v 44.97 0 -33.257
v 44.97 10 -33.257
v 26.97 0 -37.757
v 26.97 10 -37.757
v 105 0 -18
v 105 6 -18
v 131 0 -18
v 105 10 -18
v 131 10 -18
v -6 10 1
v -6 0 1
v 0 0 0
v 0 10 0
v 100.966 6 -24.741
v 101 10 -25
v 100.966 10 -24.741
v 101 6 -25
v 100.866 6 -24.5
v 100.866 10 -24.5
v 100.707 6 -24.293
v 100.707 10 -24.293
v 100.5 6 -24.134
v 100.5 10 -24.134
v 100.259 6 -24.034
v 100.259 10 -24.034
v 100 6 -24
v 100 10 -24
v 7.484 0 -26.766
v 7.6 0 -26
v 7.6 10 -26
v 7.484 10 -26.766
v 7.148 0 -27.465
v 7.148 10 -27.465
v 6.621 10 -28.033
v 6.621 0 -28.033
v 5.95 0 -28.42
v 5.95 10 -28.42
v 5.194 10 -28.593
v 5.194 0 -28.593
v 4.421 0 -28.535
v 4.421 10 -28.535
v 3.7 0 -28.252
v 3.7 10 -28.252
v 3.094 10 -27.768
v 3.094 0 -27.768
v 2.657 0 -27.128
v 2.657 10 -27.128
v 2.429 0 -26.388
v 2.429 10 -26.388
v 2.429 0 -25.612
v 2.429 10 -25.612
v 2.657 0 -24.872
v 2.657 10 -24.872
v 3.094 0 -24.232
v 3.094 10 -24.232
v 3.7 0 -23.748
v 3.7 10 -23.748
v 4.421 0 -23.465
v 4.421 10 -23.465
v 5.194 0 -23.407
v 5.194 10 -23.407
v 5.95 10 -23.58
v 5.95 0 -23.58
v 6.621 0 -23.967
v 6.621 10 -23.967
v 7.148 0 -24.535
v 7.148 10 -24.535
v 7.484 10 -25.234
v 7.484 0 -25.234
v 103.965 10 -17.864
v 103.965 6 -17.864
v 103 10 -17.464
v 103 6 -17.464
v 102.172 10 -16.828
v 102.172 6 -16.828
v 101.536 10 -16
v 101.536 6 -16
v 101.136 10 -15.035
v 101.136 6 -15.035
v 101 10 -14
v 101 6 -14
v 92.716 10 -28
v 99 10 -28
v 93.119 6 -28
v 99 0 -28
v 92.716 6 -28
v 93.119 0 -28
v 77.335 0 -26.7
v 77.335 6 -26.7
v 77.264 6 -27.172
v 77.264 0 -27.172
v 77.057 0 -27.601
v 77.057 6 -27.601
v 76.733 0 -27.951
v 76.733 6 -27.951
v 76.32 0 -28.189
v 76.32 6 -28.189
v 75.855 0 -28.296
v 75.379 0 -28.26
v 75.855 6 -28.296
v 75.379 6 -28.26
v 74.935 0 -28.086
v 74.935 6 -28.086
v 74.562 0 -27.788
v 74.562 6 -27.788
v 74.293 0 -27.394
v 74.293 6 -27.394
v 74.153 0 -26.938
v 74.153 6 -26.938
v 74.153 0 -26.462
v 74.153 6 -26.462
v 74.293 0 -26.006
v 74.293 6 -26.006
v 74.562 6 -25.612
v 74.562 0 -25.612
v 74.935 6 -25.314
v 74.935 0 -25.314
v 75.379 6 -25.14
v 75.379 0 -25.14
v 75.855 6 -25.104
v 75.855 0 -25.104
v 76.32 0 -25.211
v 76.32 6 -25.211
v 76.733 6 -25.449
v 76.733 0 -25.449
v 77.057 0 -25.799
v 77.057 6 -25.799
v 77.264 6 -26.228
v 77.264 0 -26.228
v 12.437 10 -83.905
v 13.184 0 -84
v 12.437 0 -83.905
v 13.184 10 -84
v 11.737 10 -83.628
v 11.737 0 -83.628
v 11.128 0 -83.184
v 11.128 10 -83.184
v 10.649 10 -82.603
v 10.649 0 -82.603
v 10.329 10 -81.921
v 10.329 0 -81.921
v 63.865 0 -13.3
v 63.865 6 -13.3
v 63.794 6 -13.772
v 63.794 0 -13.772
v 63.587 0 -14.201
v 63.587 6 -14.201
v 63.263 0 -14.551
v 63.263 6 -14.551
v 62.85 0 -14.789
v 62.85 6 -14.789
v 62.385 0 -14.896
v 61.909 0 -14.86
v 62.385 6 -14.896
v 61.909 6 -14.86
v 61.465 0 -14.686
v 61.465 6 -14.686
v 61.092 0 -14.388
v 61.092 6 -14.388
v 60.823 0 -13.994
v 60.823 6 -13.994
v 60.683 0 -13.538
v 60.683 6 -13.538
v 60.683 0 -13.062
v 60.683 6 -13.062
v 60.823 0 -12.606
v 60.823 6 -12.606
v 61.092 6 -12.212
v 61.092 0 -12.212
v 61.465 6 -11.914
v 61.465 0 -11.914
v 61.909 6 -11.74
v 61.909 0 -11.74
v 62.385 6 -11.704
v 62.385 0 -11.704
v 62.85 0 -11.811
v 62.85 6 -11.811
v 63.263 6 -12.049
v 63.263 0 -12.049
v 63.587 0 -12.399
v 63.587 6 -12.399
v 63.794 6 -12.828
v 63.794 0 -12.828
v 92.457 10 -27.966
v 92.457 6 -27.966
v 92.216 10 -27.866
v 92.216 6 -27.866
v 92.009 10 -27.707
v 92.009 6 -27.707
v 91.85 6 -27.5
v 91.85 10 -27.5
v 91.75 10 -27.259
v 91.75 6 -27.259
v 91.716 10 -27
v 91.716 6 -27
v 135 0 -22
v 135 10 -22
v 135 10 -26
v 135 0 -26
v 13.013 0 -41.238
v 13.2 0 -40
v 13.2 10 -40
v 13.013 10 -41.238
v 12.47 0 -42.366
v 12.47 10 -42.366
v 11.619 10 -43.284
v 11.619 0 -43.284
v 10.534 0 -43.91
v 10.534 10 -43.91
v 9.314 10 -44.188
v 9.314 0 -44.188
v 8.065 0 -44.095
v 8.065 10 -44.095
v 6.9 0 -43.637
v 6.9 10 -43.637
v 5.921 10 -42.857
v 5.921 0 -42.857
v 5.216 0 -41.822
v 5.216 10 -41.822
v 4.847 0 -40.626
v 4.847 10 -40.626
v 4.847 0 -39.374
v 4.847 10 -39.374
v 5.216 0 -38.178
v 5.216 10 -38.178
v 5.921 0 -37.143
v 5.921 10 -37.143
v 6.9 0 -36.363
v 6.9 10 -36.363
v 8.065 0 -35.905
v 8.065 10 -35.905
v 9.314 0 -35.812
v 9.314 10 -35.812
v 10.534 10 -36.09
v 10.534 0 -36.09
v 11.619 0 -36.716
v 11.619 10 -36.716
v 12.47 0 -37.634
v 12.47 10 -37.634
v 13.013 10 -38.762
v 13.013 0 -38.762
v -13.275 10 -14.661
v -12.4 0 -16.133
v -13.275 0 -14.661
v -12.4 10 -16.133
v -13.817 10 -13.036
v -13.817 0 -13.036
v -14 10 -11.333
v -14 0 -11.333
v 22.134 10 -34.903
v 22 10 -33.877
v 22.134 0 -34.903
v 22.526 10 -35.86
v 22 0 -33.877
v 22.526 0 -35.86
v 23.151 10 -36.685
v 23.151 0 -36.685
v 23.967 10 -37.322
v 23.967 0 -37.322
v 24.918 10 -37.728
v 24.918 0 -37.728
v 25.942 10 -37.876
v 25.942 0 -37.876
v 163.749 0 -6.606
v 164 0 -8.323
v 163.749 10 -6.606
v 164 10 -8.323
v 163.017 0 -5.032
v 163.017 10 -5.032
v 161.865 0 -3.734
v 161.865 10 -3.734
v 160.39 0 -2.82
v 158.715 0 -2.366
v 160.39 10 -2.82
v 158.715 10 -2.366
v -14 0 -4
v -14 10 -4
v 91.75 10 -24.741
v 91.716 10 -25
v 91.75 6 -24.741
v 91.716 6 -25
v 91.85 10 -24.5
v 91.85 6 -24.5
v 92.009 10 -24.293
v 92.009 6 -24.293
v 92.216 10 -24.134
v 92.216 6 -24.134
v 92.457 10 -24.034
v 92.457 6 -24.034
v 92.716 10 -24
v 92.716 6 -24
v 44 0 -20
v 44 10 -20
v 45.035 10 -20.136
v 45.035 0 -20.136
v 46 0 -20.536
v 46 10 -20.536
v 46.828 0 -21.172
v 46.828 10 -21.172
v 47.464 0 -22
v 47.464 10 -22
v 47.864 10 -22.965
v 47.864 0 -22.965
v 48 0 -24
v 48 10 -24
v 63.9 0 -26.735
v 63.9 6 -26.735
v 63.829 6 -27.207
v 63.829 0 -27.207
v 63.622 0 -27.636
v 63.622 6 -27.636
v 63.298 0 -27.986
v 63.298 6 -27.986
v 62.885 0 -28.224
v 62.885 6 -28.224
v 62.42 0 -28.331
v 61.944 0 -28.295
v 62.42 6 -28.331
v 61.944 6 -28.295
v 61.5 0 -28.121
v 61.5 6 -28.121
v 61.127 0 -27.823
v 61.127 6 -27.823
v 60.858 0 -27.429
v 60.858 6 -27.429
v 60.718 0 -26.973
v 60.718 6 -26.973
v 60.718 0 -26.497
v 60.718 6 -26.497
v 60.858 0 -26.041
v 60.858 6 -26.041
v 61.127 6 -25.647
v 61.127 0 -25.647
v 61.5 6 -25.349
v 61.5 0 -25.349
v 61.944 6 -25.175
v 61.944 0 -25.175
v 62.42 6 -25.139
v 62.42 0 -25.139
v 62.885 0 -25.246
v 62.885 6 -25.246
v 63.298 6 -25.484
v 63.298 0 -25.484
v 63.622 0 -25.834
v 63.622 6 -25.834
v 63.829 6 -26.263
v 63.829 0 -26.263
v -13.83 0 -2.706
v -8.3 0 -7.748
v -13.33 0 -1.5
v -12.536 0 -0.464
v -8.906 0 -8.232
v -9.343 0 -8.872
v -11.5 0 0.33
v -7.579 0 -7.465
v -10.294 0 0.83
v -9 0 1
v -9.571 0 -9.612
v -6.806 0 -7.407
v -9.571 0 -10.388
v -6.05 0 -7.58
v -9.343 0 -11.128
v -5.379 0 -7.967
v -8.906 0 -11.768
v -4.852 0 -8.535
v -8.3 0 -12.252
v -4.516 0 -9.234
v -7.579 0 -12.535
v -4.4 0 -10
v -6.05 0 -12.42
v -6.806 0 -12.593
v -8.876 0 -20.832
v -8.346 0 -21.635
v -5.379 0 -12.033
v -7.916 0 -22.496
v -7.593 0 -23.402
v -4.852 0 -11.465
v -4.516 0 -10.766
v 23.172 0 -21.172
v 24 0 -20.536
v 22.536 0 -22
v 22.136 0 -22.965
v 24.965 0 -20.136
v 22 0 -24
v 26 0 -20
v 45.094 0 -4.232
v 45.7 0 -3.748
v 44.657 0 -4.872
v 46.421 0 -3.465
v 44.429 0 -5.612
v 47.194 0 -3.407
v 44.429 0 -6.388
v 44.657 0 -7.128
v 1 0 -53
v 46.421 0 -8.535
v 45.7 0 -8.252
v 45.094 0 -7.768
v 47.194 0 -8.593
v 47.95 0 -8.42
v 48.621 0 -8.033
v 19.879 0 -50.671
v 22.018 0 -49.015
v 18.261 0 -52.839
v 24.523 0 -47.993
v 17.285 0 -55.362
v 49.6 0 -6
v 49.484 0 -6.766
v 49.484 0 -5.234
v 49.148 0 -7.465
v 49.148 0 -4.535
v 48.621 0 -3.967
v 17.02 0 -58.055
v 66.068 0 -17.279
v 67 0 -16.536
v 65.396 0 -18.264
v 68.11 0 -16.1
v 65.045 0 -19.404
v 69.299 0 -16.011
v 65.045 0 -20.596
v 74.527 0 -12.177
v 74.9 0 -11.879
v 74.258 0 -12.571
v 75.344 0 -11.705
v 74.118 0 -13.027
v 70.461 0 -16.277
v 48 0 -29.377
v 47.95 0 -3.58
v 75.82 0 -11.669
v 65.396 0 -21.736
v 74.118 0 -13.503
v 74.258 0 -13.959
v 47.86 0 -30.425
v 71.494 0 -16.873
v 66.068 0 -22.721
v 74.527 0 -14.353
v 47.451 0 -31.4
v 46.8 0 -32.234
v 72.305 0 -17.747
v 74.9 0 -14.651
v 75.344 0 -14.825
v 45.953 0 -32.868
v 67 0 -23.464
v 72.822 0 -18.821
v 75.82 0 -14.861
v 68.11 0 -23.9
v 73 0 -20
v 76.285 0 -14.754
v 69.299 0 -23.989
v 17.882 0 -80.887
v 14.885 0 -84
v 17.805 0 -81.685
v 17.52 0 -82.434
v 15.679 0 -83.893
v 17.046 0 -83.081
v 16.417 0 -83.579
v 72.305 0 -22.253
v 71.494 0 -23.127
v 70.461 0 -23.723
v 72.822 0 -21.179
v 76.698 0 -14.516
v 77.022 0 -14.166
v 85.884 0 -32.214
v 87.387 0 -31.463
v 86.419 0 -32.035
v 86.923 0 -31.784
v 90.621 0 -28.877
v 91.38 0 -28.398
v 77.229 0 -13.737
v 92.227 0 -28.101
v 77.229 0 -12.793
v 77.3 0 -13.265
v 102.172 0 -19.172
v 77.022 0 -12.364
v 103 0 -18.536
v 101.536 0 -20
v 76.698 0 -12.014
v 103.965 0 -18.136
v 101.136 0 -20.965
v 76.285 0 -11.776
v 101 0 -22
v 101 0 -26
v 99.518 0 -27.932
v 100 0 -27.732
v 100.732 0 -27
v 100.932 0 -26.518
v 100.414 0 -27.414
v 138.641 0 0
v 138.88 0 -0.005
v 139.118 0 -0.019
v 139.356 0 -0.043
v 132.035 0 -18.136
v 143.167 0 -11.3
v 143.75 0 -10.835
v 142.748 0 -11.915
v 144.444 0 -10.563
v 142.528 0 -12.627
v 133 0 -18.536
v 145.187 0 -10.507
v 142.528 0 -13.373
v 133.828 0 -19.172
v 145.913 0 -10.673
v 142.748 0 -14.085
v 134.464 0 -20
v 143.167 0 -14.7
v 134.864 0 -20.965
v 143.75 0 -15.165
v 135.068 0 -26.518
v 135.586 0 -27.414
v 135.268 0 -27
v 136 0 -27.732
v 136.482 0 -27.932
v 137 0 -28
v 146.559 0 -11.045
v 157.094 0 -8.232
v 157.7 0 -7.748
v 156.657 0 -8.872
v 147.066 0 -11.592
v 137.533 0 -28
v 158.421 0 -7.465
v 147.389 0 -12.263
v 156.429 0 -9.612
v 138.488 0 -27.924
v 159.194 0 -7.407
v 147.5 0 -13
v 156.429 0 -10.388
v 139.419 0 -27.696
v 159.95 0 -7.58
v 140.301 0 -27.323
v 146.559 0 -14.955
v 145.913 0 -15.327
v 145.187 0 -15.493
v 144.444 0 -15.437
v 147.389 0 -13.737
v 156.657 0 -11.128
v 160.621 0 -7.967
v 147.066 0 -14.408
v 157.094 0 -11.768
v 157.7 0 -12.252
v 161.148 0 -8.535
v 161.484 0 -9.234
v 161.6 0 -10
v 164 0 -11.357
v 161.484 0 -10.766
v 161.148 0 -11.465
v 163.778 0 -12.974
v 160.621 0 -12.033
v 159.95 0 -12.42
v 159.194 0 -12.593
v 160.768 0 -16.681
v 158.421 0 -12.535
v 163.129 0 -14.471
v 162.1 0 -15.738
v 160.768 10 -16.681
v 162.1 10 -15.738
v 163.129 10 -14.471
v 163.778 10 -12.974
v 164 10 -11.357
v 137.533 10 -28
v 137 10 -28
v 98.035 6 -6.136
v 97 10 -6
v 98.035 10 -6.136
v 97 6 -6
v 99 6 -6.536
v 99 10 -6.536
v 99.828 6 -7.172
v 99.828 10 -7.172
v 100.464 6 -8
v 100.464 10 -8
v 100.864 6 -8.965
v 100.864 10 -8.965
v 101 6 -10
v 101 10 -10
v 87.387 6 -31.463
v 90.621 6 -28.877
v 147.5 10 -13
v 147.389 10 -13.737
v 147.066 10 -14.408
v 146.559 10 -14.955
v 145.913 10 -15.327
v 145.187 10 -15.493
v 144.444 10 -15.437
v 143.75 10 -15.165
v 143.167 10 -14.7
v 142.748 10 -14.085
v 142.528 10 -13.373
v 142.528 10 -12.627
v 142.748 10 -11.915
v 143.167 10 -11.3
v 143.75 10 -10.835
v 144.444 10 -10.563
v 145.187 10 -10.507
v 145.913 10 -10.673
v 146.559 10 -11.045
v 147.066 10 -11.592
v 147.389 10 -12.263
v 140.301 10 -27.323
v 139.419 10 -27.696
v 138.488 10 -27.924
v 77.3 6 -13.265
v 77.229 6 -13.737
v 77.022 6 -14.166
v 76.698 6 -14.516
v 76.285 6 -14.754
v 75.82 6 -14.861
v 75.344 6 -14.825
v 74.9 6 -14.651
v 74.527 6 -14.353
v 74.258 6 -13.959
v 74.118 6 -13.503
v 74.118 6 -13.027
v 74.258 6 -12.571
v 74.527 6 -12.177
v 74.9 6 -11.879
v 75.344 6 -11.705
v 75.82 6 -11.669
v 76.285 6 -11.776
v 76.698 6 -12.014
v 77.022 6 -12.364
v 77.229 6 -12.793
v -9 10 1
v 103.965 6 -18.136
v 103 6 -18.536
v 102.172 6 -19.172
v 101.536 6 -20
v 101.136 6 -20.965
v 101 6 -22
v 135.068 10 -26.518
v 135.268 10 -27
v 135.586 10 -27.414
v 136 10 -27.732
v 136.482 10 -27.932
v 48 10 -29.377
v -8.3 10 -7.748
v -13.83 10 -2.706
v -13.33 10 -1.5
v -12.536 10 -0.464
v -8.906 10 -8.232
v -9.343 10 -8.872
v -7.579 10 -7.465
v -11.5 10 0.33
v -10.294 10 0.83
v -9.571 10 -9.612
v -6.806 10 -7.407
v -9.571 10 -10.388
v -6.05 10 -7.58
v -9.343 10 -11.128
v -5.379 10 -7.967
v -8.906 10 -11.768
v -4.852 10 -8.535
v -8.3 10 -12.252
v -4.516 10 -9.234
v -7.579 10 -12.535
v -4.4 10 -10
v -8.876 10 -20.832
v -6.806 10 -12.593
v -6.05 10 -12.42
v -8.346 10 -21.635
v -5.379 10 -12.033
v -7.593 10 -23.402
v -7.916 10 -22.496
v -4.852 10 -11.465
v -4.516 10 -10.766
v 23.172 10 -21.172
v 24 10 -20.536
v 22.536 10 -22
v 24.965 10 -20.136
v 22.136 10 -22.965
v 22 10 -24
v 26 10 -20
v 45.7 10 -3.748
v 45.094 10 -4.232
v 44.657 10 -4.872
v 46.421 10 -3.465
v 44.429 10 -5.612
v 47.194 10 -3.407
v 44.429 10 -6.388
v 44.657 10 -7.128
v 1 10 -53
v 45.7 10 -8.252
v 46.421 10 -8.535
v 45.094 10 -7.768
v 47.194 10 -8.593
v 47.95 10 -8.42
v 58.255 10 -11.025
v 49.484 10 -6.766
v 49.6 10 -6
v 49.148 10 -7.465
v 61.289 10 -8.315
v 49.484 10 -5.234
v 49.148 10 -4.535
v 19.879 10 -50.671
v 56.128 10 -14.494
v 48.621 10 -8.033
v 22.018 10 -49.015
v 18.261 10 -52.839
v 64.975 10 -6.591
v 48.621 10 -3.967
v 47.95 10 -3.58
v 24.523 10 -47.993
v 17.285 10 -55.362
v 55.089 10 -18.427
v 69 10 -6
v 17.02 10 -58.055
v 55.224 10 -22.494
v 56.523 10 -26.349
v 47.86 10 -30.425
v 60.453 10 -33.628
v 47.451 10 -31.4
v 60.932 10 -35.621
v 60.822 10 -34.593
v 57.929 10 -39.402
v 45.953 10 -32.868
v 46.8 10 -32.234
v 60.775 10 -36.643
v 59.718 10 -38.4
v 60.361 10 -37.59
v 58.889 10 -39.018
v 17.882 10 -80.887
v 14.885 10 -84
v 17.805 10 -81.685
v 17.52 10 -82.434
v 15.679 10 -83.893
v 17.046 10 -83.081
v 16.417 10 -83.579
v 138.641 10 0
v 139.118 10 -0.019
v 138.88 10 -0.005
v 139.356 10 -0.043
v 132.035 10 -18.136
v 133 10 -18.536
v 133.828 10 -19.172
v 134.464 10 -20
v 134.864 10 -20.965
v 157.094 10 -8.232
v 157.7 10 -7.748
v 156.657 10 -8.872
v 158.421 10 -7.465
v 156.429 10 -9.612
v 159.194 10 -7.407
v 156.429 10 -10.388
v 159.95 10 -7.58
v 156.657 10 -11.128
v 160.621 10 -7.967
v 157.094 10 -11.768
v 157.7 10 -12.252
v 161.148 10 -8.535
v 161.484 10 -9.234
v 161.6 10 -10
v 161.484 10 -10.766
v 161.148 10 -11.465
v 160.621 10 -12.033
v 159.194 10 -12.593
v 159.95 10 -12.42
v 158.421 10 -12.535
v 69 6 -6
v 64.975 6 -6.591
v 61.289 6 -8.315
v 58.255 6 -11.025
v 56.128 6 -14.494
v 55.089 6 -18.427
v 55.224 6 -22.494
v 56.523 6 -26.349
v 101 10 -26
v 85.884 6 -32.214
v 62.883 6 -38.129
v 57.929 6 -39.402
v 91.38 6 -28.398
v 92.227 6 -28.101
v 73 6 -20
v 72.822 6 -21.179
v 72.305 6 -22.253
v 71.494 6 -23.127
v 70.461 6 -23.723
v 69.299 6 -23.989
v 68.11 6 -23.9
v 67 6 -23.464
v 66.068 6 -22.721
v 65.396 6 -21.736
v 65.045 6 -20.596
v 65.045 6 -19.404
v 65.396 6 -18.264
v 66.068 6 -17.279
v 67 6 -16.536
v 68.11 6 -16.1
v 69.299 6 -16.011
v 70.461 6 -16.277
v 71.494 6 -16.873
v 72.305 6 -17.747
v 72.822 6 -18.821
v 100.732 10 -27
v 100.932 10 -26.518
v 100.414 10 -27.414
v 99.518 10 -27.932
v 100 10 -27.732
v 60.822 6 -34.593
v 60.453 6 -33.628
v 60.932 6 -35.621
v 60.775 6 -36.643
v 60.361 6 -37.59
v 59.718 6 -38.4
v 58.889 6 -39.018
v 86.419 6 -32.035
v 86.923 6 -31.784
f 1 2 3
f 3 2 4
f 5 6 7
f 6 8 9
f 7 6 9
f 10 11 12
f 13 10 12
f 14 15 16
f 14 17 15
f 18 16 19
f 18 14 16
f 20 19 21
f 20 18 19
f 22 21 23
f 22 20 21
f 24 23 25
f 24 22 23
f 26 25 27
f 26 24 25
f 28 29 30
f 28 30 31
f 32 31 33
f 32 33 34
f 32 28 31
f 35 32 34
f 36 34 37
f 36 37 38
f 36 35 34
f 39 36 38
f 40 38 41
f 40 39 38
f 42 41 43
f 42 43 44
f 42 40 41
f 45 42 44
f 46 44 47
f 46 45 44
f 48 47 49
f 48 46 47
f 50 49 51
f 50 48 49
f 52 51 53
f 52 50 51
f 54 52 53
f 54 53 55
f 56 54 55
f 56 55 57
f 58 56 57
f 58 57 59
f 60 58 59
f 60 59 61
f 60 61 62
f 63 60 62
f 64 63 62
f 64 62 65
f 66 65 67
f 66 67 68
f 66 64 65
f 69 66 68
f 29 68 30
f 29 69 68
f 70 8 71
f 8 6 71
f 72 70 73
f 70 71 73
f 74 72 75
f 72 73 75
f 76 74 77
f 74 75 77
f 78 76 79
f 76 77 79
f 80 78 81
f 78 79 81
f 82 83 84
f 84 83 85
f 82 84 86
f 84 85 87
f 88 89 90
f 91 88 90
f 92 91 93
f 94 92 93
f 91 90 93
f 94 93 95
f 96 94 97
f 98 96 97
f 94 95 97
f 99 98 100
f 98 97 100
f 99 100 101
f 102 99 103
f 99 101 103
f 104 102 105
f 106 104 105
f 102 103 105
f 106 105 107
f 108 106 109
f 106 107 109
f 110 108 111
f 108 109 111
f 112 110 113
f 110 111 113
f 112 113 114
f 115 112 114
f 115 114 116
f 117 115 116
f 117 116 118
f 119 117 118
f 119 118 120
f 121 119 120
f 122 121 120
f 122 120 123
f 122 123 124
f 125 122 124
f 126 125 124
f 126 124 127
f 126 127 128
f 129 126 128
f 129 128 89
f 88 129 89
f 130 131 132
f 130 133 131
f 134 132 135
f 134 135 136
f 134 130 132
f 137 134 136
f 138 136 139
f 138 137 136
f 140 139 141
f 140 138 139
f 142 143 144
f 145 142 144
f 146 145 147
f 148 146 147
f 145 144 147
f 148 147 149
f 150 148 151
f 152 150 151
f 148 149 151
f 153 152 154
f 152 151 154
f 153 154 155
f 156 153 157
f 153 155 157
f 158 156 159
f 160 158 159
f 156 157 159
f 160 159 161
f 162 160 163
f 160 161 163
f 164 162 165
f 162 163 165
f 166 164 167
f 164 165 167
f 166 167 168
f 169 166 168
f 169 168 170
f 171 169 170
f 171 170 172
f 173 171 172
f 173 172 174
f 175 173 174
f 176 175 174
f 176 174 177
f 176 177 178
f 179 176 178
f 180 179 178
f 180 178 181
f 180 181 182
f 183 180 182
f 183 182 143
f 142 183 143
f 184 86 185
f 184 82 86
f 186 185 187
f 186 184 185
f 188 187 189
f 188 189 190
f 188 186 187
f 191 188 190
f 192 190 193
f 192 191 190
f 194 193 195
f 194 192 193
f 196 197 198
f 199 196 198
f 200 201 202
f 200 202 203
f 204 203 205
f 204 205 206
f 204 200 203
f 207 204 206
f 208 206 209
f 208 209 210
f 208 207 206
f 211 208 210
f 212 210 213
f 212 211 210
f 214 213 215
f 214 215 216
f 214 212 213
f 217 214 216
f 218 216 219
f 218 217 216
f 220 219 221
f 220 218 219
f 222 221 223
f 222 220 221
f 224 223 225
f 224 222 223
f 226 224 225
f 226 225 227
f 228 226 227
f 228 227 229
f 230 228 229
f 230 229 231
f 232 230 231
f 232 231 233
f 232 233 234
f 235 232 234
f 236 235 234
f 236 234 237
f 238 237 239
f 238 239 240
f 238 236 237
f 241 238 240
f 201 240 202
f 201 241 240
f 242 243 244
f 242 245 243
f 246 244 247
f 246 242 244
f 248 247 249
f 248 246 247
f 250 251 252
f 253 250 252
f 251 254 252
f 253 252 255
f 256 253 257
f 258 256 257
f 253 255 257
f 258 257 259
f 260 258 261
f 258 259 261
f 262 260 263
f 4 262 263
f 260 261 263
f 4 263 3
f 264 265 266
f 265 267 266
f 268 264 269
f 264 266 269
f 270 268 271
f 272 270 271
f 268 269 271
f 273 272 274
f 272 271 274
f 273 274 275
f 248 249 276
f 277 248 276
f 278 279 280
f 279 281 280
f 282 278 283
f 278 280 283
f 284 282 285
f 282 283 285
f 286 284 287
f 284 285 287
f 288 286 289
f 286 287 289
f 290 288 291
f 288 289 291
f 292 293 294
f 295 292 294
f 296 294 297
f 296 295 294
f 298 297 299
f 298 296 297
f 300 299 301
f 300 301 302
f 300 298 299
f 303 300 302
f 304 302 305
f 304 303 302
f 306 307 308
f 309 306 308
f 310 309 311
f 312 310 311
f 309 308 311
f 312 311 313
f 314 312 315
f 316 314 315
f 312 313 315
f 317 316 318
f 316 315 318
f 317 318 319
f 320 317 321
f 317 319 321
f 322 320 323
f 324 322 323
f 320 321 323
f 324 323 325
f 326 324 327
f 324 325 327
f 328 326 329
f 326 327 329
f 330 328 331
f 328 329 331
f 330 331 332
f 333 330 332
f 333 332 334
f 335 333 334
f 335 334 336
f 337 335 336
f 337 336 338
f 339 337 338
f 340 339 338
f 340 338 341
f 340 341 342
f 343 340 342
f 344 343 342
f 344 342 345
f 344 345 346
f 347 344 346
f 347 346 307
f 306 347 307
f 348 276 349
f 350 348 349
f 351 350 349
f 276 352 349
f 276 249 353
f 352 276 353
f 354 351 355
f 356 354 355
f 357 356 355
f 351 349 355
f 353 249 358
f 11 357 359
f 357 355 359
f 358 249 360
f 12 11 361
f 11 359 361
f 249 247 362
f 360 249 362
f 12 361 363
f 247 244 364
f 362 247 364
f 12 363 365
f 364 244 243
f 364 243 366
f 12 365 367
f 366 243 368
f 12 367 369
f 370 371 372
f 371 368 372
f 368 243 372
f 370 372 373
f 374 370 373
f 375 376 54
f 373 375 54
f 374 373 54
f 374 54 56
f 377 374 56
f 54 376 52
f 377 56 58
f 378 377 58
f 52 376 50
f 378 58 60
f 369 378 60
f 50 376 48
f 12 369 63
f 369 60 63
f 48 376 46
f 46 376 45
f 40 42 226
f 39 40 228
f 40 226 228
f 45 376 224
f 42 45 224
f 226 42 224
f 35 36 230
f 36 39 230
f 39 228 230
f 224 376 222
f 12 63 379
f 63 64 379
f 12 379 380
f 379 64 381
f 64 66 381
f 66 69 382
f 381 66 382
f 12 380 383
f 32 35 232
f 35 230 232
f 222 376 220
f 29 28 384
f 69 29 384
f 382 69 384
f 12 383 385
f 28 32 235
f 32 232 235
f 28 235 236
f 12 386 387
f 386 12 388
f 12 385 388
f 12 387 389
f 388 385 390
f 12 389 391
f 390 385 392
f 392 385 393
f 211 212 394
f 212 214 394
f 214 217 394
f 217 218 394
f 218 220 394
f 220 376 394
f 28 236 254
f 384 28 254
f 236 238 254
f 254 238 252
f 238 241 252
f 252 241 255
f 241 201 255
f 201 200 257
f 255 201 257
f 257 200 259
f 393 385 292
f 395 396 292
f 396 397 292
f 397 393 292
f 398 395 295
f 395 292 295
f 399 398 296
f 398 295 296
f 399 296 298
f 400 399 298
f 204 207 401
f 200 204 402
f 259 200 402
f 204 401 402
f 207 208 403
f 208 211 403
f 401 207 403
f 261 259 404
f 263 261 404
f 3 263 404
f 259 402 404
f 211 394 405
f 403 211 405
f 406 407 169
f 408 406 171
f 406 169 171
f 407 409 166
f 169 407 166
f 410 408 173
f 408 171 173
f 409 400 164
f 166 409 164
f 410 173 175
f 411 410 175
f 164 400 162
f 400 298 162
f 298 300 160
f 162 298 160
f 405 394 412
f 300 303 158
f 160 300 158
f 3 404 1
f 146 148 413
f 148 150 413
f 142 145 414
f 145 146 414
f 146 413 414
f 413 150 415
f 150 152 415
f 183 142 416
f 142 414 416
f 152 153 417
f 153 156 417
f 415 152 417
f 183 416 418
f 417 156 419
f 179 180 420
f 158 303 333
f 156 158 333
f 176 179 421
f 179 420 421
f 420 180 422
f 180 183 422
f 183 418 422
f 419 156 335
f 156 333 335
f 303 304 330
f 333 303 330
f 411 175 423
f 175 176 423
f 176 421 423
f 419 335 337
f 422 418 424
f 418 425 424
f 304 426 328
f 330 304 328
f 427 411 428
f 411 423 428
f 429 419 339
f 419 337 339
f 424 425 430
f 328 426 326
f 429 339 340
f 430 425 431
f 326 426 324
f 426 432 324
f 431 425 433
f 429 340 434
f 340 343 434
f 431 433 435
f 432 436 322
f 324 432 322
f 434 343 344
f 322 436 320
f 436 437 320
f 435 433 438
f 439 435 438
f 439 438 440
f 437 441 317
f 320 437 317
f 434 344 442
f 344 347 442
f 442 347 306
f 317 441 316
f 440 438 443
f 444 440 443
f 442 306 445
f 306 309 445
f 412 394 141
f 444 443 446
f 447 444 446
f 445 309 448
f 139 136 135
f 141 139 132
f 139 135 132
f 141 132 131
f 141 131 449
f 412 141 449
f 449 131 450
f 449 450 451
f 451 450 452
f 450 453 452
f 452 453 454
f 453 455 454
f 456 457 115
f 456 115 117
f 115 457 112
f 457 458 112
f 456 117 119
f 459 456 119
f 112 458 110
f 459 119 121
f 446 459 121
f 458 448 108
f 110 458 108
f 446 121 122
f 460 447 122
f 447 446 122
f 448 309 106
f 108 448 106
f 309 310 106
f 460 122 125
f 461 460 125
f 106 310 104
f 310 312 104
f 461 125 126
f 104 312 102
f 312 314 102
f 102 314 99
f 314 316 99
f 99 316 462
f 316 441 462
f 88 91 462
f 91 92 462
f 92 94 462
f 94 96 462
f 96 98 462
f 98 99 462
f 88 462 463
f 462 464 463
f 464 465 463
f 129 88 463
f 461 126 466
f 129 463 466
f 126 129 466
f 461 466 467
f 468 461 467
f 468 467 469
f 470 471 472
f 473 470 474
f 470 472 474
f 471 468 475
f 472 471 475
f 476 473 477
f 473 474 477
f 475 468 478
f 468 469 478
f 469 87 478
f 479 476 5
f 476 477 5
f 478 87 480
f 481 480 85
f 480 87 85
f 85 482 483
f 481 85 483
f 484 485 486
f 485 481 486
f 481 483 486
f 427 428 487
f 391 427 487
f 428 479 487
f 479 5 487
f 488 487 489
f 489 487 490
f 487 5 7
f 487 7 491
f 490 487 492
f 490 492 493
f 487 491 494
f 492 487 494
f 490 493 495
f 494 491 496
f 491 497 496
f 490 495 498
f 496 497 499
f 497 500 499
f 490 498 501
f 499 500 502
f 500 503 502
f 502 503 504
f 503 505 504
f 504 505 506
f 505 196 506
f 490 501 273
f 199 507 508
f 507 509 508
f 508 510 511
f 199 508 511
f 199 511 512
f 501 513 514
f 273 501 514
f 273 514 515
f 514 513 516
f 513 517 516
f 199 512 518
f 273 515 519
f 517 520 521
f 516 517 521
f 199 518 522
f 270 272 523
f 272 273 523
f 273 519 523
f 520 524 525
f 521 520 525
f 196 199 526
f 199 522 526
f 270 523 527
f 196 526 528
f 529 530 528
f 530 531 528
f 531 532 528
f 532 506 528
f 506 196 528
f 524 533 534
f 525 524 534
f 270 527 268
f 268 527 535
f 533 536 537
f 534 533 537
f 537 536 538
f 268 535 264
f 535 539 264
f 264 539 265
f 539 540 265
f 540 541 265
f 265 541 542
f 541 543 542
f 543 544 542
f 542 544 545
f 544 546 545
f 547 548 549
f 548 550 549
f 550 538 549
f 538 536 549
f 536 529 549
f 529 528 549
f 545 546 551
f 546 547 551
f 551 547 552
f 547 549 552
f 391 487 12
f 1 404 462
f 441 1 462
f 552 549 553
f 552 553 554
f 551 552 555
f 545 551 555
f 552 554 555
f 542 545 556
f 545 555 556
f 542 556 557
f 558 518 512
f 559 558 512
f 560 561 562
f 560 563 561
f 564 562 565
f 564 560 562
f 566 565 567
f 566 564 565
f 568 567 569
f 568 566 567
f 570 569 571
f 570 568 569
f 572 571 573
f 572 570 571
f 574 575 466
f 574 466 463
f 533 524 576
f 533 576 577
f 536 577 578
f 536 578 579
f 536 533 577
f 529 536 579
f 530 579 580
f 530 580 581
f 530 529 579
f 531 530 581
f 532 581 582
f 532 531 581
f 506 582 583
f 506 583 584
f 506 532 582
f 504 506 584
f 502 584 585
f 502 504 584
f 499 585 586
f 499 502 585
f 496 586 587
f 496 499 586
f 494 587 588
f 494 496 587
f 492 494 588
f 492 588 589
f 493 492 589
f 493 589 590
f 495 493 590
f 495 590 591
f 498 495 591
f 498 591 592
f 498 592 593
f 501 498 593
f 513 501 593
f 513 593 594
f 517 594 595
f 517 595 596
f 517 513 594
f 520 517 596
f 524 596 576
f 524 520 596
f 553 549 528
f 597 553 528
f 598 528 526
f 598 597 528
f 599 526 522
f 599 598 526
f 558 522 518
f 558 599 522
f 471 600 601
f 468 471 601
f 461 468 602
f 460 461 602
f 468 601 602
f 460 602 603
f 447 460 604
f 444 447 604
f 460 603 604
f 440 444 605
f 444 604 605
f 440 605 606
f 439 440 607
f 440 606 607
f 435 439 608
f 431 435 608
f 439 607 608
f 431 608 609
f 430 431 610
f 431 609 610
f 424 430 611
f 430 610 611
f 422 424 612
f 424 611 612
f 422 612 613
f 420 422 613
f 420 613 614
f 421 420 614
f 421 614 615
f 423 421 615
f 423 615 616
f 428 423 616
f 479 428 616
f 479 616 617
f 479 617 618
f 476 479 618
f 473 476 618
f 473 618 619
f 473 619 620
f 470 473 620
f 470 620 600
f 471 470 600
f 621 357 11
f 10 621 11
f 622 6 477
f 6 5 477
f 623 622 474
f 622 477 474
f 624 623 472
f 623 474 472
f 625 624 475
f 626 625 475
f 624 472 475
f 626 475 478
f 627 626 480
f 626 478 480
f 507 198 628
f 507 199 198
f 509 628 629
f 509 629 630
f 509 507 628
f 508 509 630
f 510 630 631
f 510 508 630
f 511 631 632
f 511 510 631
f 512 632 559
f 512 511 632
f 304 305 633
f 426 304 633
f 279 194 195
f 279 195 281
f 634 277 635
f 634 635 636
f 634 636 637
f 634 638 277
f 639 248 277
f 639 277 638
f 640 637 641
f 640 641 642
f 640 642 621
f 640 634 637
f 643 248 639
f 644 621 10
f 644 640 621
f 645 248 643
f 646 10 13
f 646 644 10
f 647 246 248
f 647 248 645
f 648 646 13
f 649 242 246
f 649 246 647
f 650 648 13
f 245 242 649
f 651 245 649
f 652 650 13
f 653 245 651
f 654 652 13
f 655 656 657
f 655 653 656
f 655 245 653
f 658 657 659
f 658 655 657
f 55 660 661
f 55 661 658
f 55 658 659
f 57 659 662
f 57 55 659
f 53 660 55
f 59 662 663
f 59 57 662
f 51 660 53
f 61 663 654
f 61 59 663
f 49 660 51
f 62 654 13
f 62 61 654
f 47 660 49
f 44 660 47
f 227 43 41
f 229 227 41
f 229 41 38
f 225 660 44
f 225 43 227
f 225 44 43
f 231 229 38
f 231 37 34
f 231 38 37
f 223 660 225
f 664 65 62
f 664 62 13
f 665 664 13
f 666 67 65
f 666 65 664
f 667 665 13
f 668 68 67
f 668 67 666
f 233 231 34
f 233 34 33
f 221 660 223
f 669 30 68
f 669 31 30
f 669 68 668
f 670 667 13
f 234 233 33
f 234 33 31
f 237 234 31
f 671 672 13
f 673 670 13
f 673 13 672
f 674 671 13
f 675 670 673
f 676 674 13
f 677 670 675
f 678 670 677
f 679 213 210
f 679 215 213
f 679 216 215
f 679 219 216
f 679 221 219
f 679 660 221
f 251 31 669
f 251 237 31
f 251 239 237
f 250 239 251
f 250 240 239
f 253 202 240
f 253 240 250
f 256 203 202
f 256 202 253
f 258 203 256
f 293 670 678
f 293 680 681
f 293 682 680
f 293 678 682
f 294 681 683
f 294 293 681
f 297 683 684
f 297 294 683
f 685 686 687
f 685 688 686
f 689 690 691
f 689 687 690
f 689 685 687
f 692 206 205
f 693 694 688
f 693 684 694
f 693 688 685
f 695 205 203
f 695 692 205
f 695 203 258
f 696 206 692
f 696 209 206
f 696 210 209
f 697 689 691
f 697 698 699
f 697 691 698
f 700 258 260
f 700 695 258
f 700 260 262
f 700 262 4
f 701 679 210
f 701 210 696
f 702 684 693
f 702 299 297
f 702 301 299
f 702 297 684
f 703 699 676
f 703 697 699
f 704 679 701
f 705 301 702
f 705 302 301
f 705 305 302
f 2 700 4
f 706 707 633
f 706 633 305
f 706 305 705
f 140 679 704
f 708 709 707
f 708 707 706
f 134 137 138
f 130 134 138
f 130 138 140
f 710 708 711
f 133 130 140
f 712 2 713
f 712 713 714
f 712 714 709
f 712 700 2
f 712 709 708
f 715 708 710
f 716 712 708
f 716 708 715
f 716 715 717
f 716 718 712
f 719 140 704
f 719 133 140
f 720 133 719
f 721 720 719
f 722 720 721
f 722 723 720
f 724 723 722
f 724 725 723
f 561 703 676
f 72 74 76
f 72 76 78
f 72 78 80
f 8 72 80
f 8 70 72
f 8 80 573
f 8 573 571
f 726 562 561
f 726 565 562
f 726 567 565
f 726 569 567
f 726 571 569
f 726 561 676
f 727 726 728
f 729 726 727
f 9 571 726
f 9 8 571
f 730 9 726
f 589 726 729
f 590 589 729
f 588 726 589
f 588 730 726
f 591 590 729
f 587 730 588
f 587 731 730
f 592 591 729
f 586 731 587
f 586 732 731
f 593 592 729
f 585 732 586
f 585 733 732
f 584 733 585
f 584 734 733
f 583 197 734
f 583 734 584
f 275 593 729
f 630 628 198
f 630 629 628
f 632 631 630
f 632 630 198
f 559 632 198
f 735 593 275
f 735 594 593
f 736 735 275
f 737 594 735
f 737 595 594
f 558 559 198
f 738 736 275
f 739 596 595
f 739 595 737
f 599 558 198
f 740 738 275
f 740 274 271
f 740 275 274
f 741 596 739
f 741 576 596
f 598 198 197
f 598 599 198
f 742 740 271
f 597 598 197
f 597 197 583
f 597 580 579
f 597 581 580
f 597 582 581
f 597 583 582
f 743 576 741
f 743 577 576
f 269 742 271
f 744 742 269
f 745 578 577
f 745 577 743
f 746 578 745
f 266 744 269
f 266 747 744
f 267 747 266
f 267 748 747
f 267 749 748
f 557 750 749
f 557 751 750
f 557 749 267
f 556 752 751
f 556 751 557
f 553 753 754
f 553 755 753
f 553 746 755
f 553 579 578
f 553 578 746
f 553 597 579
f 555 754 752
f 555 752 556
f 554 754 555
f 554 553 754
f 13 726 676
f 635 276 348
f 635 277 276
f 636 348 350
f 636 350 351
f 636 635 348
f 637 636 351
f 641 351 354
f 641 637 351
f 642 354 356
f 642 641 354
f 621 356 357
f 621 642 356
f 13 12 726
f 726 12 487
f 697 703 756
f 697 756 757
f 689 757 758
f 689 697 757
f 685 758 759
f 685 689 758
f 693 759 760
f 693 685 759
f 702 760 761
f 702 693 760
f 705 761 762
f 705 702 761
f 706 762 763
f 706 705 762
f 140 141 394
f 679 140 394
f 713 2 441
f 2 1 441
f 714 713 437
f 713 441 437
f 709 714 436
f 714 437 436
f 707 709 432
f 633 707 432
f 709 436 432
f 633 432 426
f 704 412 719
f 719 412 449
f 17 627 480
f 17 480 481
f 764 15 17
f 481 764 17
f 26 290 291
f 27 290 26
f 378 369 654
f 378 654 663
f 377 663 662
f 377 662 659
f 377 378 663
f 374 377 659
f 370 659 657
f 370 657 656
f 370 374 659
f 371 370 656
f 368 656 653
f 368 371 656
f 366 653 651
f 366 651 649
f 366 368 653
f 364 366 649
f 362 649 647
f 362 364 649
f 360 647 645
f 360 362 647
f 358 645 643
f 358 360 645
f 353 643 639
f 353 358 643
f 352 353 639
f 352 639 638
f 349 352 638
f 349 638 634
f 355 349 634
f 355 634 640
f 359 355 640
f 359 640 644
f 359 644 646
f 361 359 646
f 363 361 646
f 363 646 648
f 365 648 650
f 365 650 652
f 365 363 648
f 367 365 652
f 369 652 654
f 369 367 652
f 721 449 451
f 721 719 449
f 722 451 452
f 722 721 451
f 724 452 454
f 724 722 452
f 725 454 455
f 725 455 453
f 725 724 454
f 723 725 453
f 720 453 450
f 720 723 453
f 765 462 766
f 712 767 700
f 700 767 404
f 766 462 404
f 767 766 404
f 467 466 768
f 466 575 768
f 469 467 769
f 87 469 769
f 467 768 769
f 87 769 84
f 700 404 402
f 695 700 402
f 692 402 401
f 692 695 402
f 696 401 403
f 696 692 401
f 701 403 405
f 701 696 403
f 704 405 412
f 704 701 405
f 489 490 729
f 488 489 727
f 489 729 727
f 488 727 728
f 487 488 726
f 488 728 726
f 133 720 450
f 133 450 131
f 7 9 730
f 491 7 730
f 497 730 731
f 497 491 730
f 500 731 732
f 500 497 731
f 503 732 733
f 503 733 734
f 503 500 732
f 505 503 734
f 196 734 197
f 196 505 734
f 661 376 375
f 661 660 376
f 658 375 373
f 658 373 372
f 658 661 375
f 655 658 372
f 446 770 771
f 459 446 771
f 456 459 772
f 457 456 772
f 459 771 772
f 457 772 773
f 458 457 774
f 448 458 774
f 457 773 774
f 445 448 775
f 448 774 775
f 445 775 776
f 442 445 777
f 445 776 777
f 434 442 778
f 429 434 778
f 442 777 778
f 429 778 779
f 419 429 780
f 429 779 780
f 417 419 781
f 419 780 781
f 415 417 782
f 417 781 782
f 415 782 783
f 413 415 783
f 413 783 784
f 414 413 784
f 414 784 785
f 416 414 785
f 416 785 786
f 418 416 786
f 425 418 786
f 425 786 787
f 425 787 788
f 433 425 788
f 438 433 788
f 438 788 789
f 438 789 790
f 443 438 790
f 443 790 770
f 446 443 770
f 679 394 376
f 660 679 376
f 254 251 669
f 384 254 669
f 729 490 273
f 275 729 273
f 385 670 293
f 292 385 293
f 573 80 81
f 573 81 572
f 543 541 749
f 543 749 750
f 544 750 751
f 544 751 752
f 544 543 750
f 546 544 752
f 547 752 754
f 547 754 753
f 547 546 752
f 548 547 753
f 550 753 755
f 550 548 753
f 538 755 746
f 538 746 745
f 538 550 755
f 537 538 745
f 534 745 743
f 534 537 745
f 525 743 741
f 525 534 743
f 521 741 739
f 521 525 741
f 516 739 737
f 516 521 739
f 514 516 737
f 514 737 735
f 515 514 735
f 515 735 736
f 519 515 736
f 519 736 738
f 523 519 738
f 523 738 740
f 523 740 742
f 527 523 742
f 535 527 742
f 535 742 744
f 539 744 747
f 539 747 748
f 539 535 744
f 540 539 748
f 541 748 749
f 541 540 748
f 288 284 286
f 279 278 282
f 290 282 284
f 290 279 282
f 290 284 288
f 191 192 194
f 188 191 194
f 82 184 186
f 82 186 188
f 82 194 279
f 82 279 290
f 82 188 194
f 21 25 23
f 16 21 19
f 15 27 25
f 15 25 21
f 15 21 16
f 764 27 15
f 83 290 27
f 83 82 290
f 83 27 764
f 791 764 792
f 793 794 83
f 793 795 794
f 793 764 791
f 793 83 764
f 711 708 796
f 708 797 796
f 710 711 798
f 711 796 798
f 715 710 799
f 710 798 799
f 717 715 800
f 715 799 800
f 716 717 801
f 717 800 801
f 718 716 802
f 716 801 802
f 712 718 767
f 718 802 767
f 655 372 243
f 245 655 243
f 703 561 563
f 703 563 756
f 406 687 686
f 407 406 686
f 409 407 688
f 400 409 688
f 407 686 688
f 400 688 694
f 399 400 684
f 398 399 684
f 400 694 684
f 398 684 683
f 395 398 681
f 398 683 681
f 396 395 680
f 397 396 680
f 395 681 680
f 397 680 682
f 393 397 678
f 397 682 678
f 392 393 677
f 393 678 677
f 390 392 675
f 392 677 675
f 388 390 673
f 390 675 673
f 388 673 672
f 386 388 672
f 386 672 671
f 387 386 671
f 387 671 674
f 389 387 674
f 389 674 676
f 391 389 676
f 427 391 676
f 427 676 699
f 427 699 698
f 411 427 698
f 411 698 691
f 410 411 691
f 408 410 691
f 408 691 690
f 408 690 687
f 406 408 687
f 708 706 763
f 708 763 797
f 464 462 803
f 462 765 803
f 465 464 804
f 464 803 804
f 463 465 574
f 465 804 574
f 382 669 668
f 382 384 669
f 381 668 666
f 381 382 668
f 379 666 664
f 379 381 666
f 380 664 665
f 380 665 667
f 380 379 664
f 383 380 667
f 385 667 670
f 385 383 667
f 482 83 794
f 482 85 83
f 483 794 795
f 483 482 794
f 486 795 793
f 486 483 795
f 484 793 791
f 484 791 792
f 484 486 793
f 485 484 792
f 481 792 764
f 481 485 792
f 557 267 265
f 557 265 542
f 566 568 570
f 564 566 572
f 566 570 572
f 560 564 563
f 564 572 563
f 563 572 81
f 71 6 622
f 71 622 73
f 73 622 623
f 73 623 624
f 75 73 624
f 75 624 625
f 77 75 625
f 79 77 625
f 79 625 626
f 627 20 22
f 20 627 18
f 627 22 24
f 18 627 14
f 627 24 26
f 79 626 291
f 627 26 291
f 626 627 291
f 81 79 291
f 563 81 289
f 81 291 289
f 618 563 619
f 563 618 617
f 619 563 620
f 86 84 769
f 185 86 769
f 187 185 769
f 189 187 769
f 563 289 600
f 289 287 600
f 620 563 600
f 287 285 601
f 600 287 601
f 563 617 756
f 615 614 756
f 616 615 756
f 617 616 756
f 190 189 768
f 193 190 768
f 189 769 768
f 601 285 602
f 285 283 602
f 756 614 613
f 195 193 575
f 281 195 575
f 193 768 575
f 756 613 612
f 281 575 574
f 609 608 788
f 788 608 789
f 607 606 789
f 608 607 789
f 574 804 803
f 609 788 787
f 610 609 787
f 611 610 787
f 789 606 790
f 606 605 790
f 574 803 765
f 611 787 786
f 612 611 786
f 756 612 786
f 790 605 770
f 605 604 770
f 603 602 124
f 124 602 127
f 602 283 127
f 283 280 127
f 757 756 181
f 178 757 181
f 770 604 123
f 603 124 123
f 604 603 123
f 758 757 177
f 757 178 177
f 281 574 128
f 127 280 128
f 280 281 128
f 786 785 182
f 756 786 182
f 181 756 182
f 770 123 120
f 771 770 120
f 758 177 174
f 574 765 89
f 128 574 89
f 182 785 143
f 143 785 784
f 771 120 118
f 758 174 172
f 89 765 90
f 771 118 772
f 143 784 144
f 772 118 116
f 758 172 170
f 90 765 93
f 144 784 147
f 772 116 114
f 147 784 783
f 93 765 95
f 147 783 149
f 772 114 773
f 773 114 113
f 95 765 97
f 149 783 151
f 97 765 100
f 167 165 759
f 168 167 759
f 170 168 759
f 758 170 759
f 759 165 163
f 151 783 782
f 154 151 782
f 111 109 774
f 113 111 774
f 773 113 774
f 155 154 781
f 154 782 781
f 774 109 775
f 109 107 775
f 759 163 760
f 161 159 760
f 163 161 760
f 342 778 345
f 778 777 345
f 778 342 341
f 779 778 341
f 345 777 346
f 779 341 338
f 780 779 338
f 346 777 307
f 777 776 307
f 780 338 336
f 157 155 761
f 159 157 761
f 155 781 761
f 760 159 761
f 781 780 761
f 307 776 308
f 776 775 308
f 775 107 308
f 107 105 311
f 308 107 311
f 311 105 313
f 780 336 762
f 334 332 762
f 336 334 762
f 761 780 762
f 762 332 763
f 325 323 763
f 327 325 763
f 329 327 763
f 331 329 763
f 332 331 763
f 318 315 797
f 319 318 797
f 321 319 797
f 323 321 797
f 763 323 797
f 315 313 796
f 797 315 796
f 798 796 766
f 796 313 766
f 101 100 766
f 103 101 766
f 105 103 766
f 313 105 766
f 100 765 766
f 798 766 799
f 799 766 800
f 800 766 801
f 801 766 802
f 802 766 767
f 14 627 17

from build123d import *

# Parameters (mm, degrees)
SKETCH1_R           = 2.6
SKETCH1_R_2         = 4.2
SKETCH1_R_3         = 2.5
BOSS_EXTRUDE1_DEPTH = 10
FILLET2_R           = 6
FILLET3_R           = 3
CUT_EXTRUDE1_DEPTH  = 11
SKETCH7_R           = 2.6
CUT_EXTRUDE4_DEPTH  = 11
FILLET8_R           = 5
FILLET9_R           = 4
SKETCH10_W          = 34
SKETCH10_H          = 10
CUT_EXTRUDE6_DEPTH  = 11
FILLET11_R          = 2
CUT_EXTRUDE7_DEPTH  = 4
FILLET13_R          = 10
FILLET14_R          = 4
FILLET15_R          = 1
FILLET16_R          = 4
FILLET17_R          = 4
SKETCH13_R          = 4
CUT_EXTRUDE8_DEPTH  = 10
FILLET19_R          = 8
SKETCH14_R          = 1.6
CUT_EXTRUDE9_DEPTH  = 10


with BuildPart() as part:
    # Sketch1 → Boss-Extrude1 (new body)
    with BuildSketch(Plane(origin=(0, 0, 0), x_dir=(1, 0, 0), z_dir=(0, 1, 0))):
        Polygon((164, 15), (139, 28), (91.716233646, 28), (86.716233646, 32), (16.716233646, 50), (18, 84), (11, 84), (1, 53), (-8, 22), (-14, 14), (-14, 2), (-14, -1), (-6, -1), (0, 0), (139, 0), (164, 3), align=None)
        with Locations((-7, 10)):
            Circle(SKETCH1_R, mode=Mode.SUBTRACT)
        with Locations((159, 10)):
            Circle(SKETCH1_R, mode=Mode.SUBTRACT)
        with Locations((5, 26)):
            Circle(SKETCH1_R, mode=Mode.SUBTRACT)
        with Locations((9, 40)):
            Circle(SKETCH1_R_2, mode=Mode.SUBTRACT)
        with Locations((145, 13)):
            Circle(SKETCH1_R_3, mode=Mode.SUBTRACT)
    extrude(amount=BOSS_EXTRUDE1_DEPTH)

    # Fillet2
    fillet2_edges = [part.edges().sort_by_distance(p)[0] for p in [
        (139, 5, -28),
        (164, 5, -15),
        (164, 5, -3),
        (139, 5, 0),
    ]]
    fillet(fillet2_edges, radius=FILLET2_R)

    # Fillet3
    fillet3_edges = [part.edges().sort_by_distance(p)[0] for p in [
        (11, 5, -84),
        (18, 5, -84),
    ]]
    fillet(fillet3_edges, radius=FILLET3_R)

    # Sketch4 → Cut-Extrude1 (cut, through all)
    with BuildSketch(Plane(origin=(0, 10, 0), x_dir=(1, 0, 0), z_dir=(0, 1, 0))):
        Polygon((22, 39), (22, 20), (48, 20), (48, 32.5), align=None)
    extrude(amount=-CUT_EXTRUDE1_DEPTH, mode=Mode.SUBTRACT)

    # Sketch7 → Cut-Extrude4 (cut, through all)
    with BuildSketch(Plane(origin=(0, 10, 0), x_dir=(1, 0, 0), z_dir=(0, 1, 0))):
        with Locations((47, 6)):
            Circle(SKETCH7_R)
    extrude(amount=-CUT_EXTRUDE4_DEPTH, mode=Mode.SUBTRACT)

    # Fillet8
    fillet8_edges = [part.edges().sort_by_distance(p)[0] for p in [
        (-14, 5, 1),
    ]]
    fillet(fillet8_edges, radius=FILLET8_R)

    # Fillet9
    fillet9_edges = [part.edges().sort_by_distance(p)[0] for p in [
        (22, 5, -39),
        (48, 5, -32.5),
        (48, 5, -20),
        (22, 5, -20),
    ]]
    fillet(fillet9_edges, radius=FILLET9_R)

    # Sketch10 → Cut-Extrude6 (cut, through all)
    with BuildSketch(Plane(origin=(0, 10, 0), x_dir=(1, 0, 0), z_dir=(0, 1, 0))):
        with Locations((118, 23)):
            Rectangle(SKETCH10_W, SKETCH10_H)
    extrude(amount=-CUT_EXTRUDE6_DEPTH, mode=Mode.SUBTRACT)

    # Fillet11
    fillet11_edges = [part.edges().sort_by_distance(p)[0] for p in [
        (101, 5, -28),
        (135, 5, -28),
    ]]
    fillet(fillet11_edges, radius=FILLET11_R)

    # Sketch12 → Cut-Extrude7 (cut)
    with BuildSketch(Plane(origin=(0, 10, 0), x_dir=(1, 0, 0), z_dir=(0, 1, 0))):
        with BuildLine():
            Line((86.716233646, 32), (91.716233646, 28))
            Line((91.716233646, 28), (91.716233646, 24))
            Line((91.716233646, 24), (101, 24))
            Line((101, 24), (101, 6))
            Line((101, 6), (69, 6))
            ThreePointArc((69, 6), (57.064930536, 12.681932162), (56.522621715, 26.349411873))
            Line((56.522621715, 26.349411873), (62.882866971, 38.128580002))
            Line((62.882866971, 38.128580002), (86.716233646, 32))
        make_face()
    extrude(amount=-CUT_EXTRUDE7_DEPTH, mode=Mode.SUBTRACT)

    # Fillet13
    fillet13_edges = [part.edges().sort_by_distance(p)[0] for p in [
        (16.716233646, 5, -50),
    ]]
    fillet(fillet13_edges, radius=FILLET13_R)

    # Fillet14
    fillet14_edges = [part.edges().sort_by_distance(p)[0] for p in [
        (86.716233646, 3, -32),
        (91.716233646, 3, -28),
    ]]
    fillet(fillet14_edges, radius=FILLET14_R)

    # Fillet15
    fillet15_edges = [part.edges().sort_by_distance(p)[0] for p in [
        (91.716233646, 8, -24),
        (101, 8, -24),
        (91.716233646, 8, -28),
    ]]
    fillet(fillet15_edges, radius=FILLET15_R)

    # Fillet16
    fillet16_edges = [part.edges().sort_by_distance(p)[0] for p in [
        (101, 8, -18),
        (62.882866971, 8, -38.128580002),
    ]]
    fillet(fillet16_edges, radius=FILLET16_R)

    # Fillet17
    fillet17_edges = [part.edges().sort_by_distance(p)[0] for p in [
        (101, 3, -18),
        (101, 8, -6),
        (135, 5, -18),
    ]]
    fillet(fillet17_edges, radius=FILLET17_R)

    # Sketch13 → Cut-Extrude8 (cut)
    with BuildSketch(Plane(origin=(0, 6, 0), x_dir=(1, 0, 0), z_dir=(0, 1, 0))):
        with Locations((69, 20)):
            Circle(SKETCH13_R)
    extrude(amount=-CUT_EXTRUDE8_DEPTH, mode=Mode.SUBTRACT)

    # Fillet19
    fillet19_edges = [part.edges().sort_by_distance(p)[0] for p in [
        (-14, 5, -14),
        (-8, 5, -22),
    ]]
    fillet(fillet19_edges, radius=FILLET19_R)

    # Sketch14 → Cut-Extrude9 (cut)
    with BuildSketch(Plane(origin=(0, 6, 0), x_dir=(1, 0, 0), z_dir=(0, 1, 0))):
        with Locations((62.3, 26.734983296)):
            Circle(SKETCH14_R)
        with Locations((75.734983296, 26.7)):
            Circle(SKETCH14_R)
        with Locations((75.7, 13.265016704)):
            Circle(SKETCH14_R)
        with Locations((62.265016704, 13.3)):
            Circle(SKETCH14_R)
    extrude(amount=-CUT_EXTRUDE9_DEPTH, mode=Mode.SUBTRACT)


solid = part.part
